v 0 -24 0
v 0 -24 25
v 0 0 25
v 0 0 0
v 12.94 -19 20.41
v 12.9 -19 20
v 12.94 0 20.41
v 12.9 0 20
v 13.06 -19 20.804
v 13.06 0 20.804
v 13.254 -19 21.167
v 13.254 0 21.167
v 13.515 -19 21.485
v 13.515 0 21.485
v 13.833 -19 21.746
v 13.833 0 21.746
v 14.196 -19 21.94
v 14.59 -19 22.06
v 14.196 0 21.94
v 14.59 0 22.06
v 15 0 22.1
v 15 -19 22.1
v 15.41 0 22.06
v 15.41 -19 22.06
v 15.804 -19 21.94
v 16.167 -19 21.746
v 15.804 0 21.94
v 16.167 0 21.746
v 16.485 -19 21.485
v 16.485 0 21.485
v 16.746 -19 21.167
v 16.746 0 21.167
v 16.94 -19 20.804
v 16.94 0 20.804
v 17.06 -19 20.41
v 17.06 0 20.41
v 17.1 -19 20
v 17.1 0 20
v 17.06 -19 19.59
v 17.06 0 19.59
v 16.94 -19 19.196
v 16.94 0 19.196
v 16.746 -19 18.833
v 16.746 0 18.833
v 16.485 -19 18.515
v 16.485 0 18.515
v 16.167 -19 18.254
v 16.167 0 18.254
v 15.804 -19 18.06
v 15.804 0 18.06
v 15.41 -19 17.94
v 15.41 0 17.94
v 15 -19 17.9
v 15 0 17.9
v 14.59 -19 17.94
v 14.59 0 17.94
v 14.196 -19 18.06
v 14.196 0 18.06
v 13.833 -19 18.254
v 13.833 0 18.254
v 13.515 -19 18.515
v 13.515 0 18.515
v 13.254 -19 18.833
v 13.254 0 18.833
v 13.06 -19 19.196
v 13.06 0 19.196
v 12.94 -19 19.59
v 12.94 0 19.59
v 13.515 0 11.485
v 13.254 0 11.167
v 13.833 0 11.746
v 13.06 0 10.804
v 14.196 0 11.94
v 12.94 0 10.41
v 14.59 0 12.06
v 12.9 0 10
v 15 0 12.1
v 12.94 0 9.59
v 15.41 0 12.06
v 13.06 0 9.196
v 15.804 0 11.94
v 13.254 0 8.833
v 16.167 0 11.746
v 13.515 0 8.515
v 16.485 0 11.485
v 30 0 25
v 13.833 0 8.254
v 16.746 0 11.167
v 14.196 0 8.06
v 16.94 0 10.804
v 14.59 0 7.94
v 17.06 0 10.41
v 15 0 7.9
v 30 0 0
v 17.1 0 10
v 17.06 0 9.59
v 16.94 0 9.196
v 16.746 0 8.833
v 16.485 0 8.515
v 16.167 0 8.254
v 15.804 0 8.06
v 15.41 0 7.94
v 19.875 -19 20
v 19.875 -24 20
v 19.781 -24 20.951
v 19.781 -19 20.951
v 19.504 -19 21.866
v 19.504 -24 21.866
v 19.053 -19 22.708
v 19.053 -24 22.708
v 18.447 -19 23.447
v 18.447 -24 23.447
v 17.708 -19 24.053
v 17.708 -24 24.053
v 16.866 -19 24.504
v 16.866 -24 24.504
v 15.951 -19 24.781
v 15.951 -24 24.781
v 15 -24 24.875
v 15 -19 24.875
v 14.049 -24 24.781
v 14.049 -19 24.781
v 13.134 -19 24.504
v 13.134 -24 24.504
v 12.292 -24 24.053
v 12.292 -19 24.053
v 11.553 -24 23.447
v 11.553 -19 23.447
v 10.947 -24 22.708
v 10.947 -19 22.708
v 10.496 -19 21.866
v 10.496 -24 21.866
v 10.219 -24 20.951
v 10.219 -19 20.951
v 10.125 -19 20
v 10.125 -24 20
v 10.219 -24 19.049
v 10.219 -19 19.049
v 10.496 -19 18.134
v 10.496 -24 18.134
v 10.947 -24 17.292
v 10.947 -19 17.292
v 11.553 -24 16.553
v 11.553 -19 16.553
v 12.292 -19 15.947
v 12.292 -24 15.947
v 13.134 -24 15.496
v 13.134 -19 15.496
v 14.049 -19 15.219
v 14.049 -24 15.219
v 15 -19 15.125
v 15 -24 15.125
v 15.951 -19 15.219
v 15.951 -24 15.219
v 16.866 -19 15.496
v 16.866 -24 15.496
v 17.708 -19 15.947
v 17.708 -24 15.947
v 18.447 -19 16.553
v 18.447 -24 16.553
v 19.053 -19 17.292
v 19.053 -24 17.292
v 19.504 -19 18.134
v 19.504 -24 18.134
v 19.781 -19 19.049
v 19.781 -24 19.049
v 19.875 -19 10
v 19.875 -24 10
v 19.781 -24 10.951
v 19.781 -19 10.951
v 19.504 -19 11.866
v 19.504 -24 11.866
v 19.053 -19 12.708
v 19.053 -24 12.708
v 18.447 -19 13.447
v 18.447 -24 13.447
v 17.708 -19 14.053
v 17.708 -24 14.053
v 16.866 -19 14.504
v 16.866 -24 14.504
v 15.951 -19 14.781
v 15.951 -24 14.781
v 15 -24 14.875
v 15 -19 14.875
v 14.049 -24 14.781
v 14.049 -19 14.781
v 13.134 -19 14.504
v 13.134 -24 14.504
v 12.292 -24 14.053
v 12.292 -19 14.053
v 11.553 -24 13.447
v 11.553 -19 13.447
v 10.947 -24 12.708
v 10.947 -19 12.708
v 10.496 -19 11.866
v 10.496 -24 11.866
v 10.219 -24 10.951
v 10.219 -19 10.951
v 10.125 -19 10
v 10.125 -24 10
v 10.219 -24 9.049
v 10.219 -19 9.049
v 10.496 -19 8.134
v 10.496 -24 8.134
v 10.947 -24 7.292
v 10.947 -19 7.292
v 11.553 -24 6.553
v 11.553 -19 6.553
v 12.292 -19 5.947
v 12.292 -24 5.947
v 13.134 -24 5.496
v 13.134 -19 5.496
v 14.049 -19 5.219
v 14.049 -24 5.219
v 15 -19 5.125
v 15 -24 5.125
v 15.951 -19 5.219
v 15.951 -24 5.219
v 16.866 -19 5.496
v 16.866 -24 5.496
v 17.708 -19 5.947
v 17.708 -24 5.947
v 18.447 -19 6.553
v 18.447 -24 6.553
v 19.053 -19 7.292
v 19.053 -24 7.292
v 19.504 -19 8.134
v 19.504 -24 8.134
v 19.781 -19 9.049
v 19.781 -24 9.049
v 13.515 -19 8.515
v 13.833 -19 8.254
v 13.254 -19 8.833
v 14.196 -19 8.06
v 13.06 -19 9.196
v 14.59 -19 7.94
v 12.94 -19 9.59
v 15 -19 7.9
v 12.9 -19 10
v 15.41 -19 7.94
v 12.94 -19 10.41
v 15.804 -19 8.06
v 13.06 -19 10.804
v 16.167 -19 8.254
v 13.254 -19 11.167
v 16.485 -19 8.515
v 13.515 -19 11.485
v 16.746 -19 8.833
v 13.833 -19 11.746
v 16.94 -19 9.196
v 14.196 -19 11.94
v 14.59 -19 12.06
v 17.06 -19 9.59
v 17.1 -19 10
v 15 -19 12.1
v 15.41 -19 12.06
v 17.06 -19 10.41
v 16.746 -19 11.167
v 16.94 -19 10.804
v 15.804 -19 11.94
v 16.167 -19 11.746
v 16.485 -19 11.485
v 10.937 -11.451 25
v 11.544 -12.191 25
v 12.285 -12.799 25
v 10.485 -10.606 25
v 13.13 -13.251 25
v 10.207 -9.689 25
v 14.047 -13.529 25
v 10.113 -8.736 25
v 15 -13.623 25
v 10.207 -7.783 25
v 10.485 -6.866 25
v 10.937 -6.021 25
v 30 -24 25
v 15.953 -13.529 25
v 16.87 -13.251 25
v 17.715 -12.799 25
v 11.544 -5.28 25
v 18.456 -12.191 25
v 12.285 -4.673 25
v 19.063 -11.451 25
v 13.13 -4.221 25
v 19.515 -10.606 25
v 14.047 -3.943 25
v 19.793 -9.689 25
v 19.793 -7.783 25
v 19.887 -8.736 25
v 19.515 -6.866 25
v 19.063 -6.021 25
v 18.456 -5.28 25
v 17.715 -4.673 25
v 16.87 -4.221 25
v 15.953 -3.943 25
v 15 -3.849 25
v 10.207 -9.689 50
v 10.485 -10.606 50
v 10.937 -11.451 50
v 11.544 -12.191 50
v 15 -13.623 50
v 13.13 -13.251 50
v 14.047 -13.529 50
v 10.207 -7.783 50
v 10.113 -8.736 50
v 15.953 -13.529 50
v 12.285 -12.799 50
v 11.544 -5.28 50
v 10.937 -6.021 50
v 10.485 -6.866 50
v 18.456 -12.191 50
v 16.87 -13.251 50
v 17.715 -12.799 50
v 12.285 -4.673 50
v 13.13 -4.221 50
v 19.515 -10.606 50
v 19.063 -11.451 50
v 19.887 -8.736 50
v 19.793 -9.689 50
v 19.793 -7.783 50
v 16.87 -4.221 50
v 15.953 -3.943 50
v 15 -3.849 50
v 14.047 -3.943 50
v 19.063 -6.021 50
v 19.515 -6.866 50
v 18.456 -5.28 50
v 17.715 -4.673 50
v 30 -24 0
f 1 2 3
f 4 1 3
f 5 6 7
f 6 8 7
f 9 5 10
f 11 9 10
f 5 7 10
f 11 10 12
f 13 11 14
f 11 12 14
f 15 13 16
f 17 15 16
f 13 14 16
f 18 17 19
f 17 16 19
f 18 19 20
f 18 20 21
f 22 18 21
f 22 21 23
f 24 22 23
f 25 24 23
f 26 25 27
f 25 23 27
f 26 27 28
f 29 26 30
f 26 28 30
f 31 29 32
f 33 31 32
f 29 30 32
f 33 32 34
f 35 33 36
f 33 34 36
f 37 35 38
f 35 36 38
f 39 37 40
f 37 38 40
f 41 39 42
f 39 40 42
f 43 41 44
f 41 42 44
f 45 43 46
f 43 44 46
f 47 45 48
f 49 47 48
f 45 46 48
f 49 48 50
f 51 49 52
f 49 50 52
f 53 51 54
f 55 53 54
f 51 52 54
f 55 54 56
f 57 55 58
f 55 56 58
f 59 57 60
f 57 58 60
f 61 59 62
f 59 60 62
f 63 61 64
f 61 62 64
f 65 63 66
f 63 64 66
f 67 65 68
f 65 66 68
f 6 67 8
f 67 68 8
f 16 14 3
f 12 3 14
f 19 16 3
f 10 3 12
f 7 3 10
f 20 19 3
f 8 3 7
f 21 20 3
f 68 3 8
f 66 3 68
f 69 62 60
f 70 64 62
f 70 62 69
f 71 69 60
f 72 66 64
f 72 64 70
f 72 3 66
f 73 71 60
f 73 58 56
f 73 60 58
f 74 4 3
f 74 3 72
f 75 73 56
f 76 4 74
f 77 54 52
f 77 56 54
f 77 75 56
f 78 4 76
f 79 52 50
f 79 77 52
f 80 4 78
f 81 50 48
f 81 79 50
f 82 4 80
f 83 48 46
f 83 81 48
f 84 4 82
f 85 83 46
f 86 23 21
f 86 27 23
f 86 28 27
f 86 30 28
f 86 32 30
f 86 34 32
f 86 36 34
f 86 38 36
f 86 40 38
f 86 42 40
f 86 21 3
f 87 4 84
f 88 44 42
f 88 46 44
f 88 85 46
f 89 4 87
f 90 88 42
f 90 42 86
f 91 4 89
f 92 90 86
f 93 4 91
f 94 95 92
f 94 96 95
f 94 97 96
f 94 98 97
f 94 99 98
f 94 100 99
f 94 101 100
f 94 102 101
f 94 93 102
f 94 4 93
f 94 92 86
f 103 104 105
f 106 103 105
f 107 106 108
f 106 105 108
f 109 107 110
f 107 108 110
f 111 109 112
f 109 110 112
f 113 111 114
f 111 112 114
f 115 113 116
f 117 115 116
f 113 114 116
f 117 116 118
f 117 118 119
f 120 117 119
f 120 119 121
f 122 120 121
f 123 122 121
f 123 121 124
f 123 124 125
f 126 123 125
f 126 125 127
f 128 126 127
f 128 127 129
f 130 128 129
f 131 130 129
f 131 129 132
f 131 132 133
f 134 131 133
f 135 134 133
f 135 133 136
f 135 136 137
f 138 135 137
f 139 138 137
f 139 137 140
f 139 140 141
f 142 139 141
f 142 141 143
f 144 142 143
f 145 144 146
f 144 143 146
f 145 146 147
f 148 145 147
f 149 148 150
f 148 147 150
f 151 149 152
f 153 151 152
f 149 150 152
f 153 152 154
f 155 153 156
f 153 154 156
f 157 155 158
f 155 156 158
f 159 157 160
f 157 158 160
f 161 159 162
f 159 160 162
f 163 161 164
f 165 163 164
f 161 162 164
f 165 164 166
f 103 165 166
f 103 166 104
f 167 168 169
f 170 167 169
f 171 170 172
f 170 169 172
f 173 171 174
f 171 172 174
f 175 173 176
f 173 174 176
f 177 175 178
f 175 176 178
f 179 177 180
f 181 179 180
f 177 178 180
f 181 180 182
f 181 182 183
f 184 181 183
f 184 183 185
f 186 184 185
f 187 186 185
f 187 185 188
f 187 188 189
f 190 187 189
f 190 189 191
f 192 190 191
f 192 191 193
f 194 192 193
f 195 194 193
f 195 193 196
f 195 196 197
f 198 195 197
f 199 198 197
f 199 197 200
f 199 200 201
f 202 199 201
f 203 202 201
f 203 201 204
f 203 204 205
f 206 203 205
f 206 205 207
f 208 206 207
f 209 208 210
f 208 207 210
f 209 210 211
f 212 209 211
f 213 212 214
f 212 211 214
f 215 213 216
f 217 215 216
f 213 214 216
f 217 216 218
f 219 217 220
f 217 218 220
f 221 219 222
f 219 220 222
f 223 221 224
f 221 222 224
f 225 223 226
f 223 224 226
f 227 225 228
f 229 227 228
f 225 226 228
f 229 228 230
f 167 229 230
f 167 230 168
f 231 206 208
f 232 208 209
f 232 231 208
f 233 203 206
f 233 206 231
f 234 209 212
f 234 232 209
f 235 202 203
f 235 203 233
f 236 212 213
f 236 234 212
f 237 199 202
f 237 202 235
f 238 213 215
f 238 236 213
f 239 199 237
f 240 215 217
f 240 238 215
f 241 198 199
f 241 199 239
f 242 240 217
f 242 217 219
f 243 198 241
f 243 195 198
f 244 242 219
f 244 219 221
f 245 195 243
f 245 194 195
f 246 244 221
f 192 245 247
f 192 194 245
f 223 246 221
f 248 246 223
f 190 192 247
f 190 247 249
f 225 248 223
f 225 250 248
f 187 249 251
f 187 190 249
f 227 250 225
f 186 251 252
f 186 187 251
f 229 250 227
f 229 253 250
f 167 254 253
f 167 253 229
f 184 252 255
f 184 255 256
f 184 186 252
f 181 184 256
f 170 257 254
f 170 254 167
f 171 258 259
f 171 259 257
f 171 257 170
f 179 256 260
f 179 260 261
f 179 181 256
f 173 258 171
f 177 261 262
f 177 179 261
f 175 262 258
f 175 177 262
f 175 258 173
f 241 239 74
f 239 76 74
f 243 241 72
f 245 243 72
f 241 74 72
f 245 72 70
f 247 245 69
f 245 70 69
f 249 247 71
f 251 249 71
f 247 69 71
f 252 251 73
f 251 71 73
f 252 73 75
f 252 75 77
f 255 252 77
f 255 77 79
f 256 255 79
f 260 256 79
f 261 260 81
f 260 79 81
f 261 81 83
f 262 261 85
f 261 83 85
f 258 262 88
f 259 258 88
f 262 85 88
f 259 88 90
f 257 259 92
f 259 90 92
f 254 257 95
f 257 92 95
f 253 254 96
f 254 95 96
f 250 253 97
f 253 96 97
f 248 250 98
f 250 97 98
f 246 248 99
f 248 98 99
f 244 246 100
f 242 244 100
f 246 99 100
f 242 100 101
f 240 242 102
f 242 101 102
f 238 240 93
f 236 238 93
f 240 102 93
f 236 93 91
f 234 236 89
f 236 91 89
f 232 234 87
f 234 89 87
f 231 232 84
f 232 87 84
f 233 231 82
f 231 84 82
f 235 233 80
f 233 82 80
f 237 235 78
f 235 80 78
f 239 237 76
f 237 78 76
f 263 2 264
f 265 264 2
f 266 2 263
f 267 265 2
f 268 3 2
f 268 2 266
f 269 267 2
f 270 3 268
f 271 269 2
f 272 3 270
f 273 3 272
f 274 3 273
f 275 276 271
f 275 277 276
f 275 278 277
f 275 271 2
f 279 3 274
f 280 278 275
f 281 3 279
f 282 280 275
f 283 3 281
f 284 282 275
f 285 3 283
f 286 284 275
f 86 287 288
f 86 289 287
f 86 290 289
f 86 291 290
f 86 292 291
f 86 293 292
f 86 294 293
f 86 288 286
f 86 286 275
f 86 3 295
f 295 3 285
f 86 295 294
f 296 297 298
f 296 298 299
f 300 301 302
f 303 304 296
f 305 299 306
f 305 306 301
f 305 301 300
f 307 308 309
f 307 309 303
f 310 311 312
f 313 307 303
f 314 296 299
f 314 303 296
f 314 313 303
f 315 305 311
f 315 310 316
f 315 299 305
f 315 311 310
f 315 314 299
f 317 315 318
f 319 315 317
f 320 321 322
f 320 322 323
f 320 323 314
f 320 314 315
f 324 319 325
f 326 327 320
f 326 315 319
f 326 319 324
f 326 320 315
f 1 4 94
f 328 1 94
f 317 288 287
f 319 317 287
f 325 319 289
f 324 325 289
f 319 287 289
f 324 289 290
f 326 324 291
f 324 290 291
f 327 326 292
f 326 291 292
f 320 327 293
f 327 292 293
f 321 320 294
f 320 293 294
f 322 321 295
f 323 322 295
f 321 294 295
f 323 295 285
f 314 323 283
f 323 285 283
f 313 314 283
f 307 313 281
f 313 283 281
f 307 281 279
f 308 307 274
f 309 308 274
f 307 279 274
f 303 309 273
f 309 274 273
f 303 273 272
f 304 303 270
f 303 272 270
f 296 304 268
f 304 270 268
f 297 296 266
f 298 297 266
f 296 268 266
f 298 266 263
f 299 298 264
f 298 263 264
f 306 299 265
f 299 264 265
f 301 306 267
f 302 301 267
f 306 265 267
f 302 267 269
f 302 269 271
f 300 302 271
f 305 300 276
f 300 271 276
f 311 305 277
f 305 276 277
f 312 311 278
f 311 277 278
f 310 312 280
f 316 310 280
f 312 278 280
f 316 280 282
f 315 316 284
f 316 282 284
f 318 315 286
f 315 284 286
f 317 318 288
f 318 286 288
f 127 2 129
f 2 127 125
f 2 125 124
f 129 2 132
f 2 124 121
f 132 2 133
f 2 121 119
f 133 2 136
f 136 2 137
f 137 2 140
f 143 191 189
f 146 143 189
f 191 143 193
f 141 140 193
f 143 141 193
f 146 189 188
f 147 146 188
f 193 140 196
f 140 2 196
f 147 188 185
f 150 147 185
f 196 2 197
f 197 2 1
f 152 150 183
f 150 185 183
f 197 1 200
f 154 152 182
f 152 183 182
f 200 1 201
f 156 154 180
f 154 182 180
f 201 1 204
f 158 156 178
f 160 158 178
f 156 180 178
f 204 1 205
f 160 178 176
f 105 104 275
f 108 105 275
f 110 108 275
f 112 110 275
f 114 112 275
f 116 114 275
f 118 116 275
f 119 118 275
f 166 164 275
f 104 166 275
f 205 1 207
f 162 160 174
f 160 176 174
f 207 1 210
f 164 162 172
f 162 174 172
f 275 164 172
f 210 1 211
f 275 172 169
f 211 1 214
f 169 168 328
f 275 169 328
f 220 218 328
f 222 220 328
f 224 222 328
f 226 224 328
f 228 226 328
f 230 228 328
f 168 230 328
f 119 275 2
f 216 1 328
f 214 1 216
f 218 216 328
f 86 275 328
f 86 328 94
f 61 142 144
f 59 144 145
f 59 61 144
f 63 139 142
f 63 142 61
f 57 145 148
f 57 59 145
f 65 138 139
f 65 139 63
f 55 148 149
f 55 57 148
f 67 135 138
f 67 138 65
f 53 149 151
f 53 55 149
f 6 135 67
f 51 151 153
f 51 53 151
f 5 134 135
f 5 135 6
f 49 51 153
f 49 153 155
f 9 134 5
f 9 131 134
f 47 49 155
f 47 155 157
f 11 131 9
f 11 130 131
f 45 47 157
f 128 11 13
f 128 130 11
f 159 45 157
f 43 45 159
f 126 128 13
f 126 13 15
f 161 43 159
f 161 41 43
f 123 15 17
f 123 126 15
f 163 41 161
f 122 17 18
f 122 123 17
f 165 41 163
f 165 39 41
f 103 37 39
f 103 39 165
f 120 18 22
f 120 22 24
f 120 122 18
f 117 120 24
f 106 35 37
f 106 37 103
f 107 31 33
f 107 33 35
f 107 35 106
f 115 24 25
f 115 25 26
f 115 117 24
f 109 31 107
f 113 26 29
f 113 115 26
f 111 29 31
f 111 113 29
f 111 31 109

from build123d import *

# Parameters (mm, degrees)
F0_W           = 30
F0_H           = 24
F1_DEPTH       = 25
F3_D           = 4.2
F3_CBORE_D     = 9.75
F3_CBORE_DEPTH = 5
F4_R           = 4.8868240238
F5_DEPTH       = 25


with BuildPart() as f1:
    # F0 (on Top) → F1 (new body)
    with BuildSketch(Plane.XY):
        with Locations((15, -12)):
            Rectangle(F0_W, F0_H)
    extrude(amount=F1_DEPTH)

    # F3 (through all)
    with Locations(Plane.XZ.offset(24)):
        with Locations((15, 20), (15, 10)):
            CounterBoreHole(F3_D / 2, F3_CBORE_D / 2, F3_CBORE_DEPTH)

    # F4 (on face) → F5 (join)
    with BuildSketch(Plane.XY.offset(25)):
        with Locations((15, -8.7359920144)):
            Circle(F4_R)
    extrude(amount=F5_DEPTH)


solid = f1.part
